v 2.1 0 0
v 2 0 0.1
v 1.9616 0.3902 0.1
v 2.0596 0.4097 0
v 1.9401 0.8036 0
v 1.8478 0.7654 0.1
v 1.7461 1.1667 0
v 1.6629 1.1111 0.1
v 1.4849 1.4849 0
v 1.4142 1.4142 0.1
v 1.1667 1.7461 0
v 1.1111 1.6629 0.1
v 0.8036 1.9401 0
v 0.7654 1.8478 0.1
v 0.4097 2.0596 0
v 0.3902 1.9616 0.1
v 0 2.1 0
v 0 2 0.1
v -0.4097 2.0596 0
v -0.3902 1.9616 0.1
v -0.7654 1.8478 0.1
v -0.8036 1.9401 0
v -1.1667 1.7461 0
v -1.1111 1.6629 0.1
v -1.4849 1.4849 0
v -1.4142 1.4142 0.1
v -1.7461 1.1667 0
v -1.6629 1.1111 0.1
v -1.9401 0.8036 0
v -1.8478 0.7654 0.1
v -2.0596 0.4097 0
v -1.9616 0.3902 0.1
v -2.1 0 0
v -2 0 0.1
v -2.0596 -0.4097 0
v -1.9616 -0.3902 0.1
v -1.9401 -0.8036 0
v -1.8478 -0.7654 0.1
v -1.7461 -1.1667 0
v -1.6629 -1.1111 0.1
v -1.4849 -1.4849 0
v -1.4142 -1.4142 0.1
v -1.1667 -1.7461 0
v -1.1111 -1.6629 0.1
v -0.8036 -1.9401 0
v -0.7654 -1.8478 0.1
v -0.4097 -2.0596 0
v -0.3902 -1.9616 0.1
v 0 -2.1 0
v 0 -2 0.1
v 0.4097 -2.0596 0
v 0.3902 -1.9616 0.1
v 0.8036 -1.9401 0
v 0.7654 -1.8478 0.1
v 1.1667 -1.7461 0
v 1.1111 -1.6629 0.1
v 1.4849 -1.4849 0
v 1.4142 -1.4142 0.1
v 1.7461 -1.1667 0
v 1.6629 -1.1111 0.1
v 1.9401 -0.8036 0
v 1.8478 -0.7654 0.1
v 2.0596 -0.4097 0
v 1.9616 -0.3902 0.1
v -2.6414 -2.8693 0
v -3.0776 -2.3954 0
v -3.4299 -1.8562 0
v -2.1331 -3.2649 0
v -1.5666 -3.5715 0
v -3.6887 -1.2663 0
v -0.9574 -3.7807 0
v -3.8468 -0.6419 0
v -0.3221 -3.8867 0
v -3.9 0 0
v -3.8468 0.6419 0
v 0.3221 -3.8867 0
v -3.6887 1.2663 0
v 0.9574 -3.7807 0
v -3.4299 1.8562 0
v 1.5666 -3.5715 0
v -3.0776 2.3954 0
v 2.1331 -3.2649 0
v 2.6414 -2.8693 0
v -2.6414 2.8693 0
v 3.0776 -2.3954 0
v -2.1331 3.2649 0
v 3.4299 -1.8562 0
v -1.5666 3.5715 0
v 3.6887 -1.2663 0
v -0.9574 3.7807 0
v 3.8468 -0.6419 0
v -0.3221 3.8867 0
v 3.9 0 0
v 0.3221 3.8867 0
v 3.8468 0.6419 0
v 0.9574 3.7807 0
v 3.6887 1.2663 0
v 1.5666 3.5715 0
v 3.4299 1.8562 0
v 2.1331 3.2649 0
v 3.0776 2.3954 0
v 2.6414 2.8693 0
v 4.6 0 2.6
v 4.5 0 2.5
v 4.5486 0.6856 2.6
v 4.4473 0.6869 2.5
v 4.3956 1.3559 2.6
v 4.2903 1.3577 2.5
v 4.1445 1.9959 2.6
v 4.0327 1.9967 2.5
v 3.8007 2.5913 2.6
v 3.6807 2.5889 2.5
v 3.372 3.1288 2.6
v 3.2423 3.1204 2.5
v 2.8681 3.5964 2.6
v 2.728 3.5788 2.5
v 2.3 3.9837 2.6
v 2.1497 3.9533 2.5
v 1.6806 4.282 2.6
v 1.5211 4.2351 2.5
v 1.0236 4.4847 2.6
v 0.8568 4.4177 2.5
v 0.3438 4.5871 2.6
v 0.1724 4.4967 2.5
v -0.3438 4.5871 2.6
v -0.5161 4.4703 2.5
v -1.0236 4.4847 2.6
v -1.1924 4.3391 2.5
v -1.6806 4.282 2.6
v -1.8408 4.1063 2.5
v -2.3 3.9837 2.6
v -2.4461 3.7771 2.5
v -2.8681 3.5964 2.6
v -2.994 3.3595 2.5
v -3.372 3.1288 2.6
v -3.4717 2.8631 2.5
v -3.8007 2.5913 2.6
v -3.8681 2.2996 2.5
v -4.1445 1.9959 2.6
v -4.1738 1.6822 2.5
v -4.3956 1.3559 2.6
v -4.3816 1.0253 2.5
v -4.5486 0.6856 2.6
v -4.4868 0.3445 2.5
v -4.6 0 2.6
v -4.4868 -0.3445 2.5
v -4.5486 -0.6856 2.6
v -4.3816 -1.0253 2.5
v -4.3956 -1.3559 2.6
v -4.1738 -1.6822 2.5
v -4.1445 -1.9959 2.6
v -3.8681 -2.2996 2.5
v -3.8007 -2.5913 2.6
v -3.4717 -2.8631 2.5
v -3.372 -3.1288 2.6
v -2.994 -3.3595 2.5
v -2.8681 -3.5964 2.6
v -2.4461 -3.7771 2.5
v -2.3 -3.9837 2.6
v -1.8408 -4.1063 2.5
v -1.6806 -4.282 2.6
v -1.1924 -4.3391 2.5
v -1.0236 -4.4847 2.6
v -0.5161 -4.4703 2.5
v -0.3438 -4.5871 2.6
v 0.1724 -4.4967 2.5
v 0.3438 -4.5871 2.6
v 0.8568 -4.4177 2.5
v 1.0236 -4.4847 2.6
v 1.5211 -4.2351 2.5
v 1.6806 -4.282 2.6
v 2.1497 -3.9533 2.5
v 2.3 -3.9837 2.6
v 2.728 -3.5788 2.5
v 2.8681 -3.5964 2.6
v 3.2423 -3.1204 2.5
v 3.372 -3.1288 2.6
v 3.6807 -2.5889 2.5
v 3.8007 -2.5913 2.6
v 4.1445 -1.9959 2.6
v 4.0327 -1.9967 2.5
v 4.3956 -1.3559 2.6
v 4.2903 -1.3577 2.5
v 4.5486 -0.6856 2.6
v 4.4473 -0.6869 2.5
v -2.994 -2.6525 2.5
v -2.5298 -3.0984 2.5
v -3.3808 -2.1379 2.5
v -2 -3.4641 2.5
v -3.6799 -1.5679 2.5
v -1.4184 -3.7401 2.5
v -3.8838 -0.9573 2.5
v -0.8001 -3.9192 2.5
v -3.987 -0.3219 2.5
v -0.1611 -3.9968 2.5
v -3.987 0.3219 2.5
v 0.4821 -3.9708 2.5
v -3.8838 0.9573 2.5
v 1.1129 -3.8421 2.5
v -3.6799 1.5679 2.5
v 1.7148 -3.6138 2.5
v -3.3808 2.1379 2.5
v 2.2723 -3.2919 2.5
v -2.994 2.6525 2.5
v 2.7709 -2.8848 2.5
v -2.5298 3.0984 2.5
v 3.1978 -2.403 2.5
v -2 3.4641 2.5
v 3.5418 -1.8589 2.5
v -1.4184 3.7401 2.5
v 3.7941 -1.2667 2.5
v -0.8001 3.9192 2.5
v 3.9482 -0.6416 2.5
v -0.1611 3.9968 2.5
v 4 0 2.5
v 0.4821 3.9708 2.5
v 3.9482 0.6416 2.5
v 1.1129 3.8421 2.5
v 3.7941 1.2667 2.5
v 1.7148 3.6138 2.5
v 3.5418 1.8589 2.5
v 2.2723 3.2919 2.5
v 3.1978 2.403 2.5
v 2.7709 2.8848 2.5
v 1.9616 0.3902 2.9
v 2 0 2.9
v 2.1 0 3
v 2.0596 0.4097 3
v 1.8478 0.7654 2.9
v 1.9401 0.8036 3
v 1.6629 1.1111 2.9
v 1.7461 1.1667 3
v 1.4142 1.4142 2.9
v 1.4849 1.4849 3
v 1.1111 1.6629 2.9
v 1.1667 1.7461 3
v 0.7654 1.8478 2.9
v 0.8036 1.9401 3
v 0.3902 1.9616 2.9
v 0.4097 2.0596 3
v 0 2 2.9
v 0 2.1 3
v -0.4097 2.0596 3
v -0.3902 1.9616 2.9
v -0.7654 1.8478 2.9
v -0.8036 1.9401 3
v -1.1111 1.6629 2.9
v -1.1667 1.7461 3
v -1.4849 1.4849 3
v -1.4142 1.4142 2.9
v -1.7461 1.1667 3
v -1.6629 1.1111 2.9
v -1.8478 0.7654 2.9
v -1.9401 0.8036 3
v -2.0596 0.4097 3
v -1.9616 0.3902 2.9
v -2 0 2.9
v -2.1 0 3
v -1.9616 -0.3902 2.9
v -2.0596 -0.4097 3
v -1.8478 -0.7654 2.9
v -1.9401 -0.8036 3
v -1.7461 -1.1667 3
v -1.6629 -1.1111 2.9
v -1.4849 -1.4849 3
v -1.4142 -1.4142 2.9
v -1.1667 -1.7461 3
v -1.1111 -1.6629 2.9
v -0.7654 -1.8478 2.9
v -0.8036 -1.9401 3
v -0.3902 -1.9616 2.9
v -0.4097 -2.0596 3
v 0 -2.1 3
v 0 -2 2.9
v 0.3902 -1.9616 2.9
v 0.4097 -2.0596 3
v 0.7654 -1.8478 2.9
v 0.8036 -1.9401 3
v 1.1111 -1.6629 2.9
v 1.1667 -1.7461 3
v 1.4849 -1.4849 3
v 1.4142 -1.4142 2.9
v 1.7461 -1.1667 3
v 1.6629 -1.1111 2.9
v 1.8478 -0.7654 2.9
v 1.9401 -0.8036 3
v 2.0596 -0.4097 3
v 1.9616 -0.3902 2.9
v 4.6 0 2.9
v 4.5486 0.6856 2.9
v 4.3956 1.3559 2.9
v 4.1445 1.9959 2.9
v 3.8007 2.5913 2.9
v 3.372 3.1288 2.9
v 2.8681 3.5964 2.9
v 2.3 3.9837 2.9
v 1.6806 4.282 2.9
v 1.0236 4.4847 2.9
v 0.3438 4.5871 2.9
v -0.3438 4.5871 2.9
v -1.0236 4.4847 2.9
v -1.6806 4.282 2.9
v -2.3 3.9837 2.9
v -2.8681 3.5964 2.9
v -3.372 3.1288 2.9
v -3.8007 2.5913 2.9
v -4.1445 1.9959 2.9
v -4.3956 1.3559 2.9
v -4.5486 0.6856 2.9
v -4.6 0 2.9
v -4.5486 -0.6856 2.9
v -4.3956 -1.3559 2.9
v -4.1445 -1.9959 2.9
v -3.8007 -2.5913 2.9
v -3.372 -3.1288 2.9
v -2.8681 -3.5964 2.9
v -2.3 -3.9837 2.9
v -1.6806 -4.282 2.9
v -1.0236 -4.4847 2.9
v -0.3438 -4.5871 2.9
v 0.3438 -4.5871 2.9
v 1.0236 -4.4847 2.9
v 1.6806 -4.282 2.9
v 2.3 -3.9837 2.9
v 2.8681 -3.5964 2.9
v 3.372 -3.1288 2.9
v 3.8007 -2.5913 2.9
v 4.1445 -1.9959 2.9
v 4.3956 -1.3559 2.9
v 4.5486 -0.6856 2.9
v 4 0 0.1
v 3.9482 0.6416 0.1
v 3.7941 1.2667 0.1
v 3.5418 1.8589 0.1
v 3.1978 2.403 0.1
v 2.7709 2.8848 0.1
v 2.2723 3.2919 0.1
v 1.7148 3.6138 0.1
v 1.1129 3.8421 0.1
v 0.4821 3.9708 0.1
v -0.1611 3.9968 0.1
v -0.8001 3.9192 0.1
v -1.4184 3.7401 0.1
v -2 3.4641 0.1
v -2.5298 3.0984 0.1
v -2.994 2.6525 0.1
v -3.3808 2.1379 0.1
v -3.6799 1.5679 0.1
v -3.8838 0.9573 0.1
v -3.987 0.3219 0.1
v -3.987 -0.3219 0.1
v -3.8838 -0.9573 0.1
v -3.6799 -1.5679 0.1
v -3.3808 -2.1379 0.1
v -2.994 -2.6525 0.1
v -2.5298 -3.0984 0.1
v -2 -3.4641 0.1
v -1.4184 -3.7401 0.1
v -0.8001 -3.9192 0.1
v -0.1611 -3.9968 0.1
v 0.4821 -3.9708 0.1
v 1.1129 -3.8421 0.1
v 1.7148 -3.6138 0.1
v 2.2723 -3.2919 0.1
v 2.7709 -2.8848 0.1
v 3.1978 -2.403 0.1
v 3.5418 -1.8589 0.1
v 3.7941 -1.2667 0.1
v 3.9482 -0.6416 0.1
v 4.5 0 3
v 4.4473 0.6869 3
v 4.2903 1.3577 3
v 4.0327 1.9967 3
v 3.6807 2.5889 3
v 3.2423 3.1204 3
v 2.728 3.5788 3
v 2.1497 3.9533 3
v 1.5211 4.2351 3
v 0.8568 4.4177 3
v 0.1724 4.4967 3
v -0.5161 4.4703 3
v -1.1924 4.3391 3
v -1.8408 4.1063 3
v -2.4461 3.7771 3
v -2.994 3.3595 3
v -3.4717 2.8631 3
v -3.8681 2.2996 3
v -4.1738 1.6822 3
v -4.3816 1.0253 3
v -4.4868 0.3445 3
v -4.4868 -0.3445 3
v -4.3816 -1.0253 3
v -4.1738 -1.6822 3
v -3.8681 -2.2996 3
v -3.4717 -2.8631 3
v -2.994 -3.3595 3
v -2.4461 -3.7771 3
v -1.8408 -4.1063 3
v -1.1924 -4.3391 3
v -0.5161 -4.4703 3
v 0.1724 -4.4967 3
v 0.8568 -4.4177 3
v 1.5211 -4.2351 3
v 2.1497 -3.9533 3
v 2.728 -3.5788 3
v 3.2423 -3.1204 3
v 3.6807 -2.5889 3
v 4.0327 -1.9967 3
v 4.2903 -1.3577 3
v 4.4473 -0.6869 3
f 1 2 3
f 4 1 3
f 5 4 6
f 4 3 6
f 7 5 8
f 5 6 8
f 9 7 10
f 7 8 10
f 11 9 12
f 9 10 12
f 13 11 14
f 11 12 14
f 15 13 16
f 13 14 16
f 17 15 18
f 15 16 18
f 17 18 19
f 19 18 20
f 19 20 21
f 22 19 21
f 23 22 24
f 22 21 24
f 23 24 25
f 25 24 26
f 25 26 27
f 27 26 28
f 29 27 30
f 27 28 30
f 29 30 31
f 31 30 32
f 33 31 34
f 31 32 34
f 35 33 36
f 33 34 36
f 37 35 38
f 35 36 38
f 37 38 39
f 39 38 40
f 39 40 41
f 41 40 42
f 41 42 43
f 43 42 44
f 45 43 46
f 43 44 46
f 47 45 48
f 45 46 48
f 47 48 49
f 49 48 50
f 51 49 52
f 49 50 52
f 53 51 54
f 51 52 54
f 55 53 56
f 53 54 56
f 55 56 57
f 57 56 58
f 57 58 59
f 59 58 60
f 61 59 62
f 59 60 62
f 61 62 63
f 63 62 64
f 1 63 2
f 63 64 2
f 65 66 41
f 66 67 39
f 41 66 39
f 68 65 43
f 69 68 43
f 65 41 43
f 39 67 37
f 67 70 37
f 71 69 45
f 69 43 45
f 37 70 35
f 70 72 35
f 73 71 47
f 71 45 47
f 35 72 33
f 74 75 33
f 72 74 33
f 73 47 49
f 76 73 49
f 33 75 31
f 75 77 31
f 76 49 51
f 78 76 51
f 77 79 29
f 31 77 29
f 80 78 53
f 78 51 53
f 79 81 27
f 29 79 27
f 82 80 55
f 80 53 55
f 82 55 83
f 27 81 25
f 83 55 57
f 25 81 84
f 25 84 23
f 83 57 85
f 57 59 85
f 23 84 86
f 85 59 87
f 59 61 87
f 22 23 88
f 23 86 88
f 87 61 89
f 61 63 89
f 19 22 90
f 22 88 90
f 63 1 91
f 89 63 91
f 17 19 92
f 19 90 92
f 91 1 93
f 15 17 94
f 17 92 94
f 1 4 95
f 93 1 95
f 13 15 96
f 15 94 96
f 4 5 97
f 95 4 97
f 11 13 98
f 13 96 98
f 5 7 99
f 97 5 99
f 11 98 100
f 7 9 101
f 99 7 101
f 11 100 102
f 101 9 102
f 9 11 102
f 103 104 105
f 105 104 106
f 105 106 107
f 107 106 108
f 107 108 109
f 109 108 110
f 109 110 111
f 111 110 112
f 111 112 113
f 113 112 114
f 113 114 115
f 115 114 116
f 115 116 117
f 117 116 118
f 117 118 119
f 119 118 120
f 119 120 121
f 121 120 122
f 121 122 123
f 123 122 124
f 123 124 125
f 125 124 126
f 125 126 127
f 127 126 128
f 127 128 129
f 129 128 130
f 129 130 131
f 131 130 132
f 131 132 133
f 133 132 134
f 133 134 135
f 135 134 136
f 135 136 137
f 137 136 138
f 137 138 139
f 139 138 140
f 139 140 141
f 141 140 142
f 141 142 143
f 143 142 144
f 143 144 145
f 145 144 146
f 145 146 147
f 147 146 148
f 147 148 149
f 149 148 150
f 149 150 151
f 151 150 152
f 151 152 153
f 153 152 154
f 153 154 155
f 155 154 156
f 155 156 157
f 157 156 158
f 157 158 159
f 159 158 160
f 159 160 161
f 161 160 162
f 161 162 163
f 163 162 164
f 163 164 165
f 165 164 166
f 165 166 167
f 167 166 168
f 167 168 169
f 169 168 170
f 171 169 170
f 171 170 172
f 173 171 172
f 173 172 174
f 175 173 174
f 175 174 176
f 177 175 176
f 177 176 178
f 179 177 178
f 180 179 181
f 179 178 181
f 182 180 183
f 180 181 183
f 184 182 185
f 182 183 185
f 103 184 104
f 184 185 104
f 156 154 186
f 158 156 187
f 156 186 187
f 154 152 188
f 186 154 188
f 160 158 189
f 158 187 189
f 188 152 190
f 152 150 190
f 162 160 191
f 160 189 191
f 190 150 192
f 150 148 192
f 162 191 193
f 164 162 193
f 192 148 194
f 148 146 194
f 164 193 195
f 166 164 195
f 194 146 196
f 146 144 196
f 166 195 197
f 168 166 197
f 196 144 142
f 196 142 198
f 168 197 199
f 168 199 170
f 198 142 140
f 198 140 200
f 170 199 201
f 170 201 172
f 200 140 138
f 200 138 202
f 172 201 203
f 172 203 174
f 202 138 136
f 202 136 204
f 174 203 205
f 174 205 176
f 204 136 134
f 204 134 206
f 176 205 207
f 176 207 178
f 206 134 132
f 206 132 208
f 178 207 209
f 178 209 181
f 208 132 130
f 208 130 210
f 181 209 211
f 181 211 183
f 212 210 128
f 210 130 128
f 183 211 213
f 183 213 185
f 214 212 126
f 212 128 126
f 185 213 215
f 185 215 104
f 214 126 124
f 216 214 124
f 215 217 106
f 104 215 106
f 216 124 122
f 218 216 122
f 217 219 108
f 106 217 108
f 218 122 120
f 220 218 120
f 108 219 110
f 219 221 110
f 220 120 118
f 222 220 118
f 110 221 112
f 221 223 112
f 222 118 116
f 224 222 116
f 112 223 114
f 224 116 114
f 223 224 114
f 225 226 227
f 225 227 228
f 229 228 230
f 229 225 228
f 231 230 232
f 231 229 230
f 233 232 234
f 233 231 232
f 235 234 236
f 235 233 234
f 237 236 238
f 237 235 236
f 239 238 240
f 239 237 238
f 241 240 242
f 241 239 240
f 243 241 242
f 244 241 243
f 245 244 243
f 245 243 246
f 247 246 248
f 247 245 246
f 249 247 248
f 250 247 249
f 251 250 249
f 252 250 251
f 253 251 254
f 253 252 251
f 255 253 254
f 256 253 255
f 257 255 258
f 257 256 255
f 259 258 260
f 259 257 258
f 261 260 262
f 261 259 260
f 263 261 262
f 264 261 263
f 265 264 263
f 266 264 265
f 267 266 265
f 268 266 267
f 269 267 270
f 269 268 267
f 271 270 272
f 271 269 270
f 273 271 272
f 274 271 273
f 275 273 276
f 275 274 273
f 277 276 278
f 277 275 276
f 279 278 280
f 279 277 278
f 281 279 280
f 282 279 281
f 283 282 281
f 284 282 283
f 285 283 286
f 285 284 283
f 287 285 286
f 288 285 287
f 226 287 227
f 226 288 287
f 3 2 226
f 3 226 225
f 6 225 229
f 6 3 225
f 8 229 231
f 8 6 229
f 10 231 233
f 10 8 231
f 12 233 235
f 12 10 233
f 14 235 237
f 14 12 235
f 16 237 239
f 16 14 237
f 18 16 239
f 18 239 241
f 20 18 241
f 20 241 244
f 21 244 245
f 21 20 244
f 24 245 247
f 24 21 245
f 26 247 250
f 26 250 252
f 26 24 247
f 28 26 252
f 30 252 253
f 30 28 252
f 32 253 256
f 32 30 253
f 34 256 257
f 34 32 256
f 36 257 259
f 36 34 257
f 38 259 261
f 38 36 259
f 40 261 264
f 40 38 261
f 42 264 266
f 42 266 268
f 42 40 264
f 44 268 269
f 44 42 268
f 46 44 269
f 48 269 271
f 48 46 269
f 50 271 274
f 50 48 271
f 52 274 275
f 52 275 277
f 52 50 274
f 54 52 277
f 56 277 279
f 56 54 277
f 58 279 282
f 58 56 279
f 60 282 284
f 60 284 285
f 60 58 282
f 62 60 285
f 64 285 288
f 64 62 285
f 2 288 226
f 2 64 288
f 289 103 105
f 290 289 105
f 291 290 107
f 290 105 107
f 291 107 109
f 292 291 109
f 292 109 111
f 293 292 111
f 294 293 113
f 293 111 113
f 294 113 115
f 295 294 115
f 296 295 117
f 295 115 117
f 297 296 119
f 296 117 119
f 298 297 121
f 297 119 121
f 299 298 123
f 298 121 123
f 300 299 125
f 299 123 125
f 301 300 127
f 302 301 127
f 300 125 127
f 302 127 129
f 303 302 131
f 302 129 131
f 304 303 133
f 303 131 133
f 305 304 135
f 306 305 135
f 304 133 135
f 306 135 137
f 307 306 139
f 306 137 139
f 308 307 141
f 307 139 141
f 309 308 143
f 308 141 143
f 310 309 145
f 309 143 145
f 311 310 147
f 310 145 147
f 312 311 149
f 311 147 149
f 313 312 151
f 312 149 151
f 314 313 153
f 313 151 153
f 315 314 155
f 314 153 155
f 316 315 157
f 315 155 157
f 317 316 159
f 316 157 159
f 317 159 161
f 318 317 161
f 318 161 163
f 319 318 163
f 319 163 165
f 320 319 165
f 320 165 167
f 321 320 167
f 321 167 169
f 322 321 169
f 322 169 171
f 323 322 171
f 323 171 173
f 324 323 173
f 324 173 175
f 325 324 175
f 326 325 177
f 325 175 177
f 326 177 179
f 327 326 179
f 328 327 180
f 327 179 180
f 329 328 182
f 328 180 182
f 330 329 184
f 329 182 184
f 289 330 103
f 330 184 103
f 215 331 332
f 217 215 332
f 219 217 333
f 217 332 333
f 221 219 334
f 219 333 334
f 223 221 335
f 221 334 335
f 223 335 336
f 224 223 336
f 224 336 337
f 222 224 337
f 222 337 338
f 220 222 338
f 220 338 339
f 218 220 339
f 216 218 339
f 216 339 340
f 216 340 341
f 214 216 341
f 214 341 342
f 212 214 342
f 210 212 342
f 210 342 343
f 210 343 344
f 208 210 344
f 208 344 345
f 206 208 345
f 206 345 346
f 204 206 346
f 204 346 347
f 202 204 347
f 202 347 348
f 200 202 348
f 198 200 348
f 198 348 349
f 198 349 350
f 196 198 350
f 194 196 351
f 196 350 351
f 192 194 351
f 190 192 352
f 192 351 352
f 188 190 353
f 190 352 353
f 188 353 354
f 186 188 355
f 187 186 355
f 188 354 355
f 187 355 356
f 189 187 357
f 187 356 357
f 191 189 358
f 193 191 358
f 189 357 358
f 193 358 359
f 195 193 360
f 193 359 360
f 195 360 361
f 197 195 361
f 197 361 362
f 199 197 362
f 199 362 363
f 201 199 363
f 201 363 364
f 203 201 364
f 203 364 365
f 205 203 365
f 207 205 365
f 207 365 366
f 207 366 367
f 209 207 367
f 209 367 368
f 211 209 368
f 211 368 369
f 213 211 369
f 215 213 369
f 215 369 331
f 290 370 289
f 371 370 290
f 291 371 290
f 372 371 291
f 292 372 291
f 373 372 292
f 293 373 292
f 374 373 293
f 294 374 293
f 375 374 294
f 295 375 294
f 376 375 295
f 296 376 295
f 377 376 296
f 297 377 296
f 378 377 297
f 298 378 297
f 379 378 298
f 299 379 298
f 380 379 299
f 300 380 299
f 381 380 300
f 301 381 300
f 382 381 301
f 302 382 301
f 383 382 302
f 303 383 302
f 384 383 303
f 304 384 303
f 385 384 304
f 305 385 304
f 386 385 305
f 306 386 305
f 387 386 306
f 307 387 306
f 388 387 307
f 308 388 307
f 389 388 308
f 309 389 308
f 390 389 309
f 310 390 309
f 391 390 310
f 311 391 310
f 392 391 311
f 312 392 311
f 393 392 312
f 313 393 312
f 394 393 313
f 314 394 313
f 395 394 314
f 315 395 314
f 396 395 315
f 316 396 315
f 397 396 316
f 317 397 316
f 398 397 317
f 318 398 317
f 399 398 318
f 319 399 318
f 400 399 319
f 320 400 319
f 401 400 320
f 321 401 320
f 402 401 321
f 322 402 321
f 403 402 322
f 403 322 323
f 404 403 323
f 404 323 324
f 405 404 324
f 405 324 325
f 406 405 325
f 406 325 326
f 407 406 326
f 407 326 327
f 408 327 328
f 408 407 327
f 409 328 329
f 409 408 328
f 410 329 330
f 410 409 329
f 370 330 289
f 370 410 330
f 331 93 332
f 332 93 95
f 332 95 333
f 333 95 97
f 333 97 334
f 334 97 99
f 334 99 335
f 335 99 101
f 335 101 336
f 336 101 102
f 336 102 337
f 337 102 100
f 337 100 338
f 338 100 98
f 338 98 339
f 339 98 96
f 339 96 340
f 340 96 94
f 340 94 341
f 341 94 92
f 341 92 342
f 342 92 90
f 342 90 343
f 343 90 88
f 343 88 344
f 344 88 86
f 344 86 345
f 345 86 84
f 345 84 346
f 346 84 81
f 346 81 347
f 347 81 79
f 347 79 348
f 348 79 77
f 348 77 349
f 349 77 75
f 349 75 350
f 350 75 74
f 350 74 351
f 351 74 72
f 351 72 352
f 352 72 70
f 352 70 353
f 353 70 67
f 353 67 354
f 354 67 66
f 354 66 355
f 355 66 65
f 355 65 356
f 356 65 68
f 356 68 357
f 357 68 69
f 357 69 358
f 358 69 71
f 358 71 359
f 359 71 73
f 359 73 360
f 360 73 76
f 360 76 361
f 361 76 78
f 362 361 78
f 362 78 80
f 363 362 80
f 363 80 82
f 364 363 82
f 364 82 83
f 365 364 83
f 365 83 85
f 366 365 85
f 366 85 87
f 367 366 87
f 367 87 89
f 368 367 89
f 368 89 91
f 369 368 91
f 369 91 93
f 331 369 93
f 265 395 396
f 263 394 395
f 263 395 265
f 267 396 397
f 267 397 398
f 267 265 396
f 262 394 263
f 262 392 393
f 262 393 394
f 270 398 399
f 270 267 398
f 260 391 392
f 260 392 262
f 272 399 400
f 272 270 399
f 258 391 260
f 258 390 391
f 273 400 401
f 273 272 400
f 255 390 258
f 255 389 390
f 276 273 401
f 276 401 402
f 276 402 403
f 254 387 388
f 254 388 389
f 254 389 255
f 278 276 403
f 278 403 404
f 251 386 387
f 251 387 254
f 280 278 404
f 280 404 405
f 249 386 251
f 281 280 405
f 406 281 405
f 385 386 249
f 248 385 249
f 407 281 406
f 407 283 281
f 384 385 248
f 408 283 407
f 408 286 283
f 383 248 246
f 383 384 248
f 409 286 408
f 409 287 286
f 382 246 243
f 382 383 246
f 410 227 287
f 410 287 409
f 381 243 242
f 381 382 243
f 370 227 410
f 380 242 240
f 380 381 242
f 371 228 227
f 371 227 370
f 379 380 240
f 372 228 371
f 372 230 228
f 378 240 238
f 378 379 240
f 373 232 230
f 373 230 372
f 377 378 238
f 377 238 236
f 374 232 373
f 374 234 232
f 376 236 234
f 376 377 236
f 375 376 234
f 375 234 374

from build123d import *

# Parameters (mm, degrees)
SKETCH_1_R      = 4
SKETCH_1_R_2    = 2
EXTRUDE_1_DEPTH = 3
EXTRUDE_START   = -0.5
SKETCH_2_R      = 4.6
SKETCH_2_R_2    = 4
EXTRUDE_2_DEPTH = 0.5
CHAMFER_1_SIZE  = 0.1


with BuildPart() as part:
    # 草图1 → 凸台-拉伸1 (new body)
    with BuildSketch(Plane.XY):
        Circle(SKETCH_1_R)
        Circle(SKETCH_1_R_2, mode=Mode.SUBTRACT)
    extrude(amount=EXTRUDE_1_DEPTH)

    # 草图2 → 凸台-拉伸2 (add)
    with BuildSketch(Plane.XY.offset(3).offset(EXTRUDE_START)):
        Circle(SKETCH_2_R)
        Circle(SKETCH_2_R_2, mode=Mode.SUBTRACT)
    extrude(amount=EXTRUDE_2_DEPTH)

    # 倒角1
    chamfer_1_edges = [part.edges().sort_by_distance(p)[0] for p in [
        (-4.6, 0, 2.5),
        (-4.6, 0, 3),
        (-4, 0, 0),
        (-2, 0, 0),
        (-2, 0, 3),
    ]]
    chamfer(chamfer_1_edges, length=CHAMFER_1_SIZE)


solid = part.part
